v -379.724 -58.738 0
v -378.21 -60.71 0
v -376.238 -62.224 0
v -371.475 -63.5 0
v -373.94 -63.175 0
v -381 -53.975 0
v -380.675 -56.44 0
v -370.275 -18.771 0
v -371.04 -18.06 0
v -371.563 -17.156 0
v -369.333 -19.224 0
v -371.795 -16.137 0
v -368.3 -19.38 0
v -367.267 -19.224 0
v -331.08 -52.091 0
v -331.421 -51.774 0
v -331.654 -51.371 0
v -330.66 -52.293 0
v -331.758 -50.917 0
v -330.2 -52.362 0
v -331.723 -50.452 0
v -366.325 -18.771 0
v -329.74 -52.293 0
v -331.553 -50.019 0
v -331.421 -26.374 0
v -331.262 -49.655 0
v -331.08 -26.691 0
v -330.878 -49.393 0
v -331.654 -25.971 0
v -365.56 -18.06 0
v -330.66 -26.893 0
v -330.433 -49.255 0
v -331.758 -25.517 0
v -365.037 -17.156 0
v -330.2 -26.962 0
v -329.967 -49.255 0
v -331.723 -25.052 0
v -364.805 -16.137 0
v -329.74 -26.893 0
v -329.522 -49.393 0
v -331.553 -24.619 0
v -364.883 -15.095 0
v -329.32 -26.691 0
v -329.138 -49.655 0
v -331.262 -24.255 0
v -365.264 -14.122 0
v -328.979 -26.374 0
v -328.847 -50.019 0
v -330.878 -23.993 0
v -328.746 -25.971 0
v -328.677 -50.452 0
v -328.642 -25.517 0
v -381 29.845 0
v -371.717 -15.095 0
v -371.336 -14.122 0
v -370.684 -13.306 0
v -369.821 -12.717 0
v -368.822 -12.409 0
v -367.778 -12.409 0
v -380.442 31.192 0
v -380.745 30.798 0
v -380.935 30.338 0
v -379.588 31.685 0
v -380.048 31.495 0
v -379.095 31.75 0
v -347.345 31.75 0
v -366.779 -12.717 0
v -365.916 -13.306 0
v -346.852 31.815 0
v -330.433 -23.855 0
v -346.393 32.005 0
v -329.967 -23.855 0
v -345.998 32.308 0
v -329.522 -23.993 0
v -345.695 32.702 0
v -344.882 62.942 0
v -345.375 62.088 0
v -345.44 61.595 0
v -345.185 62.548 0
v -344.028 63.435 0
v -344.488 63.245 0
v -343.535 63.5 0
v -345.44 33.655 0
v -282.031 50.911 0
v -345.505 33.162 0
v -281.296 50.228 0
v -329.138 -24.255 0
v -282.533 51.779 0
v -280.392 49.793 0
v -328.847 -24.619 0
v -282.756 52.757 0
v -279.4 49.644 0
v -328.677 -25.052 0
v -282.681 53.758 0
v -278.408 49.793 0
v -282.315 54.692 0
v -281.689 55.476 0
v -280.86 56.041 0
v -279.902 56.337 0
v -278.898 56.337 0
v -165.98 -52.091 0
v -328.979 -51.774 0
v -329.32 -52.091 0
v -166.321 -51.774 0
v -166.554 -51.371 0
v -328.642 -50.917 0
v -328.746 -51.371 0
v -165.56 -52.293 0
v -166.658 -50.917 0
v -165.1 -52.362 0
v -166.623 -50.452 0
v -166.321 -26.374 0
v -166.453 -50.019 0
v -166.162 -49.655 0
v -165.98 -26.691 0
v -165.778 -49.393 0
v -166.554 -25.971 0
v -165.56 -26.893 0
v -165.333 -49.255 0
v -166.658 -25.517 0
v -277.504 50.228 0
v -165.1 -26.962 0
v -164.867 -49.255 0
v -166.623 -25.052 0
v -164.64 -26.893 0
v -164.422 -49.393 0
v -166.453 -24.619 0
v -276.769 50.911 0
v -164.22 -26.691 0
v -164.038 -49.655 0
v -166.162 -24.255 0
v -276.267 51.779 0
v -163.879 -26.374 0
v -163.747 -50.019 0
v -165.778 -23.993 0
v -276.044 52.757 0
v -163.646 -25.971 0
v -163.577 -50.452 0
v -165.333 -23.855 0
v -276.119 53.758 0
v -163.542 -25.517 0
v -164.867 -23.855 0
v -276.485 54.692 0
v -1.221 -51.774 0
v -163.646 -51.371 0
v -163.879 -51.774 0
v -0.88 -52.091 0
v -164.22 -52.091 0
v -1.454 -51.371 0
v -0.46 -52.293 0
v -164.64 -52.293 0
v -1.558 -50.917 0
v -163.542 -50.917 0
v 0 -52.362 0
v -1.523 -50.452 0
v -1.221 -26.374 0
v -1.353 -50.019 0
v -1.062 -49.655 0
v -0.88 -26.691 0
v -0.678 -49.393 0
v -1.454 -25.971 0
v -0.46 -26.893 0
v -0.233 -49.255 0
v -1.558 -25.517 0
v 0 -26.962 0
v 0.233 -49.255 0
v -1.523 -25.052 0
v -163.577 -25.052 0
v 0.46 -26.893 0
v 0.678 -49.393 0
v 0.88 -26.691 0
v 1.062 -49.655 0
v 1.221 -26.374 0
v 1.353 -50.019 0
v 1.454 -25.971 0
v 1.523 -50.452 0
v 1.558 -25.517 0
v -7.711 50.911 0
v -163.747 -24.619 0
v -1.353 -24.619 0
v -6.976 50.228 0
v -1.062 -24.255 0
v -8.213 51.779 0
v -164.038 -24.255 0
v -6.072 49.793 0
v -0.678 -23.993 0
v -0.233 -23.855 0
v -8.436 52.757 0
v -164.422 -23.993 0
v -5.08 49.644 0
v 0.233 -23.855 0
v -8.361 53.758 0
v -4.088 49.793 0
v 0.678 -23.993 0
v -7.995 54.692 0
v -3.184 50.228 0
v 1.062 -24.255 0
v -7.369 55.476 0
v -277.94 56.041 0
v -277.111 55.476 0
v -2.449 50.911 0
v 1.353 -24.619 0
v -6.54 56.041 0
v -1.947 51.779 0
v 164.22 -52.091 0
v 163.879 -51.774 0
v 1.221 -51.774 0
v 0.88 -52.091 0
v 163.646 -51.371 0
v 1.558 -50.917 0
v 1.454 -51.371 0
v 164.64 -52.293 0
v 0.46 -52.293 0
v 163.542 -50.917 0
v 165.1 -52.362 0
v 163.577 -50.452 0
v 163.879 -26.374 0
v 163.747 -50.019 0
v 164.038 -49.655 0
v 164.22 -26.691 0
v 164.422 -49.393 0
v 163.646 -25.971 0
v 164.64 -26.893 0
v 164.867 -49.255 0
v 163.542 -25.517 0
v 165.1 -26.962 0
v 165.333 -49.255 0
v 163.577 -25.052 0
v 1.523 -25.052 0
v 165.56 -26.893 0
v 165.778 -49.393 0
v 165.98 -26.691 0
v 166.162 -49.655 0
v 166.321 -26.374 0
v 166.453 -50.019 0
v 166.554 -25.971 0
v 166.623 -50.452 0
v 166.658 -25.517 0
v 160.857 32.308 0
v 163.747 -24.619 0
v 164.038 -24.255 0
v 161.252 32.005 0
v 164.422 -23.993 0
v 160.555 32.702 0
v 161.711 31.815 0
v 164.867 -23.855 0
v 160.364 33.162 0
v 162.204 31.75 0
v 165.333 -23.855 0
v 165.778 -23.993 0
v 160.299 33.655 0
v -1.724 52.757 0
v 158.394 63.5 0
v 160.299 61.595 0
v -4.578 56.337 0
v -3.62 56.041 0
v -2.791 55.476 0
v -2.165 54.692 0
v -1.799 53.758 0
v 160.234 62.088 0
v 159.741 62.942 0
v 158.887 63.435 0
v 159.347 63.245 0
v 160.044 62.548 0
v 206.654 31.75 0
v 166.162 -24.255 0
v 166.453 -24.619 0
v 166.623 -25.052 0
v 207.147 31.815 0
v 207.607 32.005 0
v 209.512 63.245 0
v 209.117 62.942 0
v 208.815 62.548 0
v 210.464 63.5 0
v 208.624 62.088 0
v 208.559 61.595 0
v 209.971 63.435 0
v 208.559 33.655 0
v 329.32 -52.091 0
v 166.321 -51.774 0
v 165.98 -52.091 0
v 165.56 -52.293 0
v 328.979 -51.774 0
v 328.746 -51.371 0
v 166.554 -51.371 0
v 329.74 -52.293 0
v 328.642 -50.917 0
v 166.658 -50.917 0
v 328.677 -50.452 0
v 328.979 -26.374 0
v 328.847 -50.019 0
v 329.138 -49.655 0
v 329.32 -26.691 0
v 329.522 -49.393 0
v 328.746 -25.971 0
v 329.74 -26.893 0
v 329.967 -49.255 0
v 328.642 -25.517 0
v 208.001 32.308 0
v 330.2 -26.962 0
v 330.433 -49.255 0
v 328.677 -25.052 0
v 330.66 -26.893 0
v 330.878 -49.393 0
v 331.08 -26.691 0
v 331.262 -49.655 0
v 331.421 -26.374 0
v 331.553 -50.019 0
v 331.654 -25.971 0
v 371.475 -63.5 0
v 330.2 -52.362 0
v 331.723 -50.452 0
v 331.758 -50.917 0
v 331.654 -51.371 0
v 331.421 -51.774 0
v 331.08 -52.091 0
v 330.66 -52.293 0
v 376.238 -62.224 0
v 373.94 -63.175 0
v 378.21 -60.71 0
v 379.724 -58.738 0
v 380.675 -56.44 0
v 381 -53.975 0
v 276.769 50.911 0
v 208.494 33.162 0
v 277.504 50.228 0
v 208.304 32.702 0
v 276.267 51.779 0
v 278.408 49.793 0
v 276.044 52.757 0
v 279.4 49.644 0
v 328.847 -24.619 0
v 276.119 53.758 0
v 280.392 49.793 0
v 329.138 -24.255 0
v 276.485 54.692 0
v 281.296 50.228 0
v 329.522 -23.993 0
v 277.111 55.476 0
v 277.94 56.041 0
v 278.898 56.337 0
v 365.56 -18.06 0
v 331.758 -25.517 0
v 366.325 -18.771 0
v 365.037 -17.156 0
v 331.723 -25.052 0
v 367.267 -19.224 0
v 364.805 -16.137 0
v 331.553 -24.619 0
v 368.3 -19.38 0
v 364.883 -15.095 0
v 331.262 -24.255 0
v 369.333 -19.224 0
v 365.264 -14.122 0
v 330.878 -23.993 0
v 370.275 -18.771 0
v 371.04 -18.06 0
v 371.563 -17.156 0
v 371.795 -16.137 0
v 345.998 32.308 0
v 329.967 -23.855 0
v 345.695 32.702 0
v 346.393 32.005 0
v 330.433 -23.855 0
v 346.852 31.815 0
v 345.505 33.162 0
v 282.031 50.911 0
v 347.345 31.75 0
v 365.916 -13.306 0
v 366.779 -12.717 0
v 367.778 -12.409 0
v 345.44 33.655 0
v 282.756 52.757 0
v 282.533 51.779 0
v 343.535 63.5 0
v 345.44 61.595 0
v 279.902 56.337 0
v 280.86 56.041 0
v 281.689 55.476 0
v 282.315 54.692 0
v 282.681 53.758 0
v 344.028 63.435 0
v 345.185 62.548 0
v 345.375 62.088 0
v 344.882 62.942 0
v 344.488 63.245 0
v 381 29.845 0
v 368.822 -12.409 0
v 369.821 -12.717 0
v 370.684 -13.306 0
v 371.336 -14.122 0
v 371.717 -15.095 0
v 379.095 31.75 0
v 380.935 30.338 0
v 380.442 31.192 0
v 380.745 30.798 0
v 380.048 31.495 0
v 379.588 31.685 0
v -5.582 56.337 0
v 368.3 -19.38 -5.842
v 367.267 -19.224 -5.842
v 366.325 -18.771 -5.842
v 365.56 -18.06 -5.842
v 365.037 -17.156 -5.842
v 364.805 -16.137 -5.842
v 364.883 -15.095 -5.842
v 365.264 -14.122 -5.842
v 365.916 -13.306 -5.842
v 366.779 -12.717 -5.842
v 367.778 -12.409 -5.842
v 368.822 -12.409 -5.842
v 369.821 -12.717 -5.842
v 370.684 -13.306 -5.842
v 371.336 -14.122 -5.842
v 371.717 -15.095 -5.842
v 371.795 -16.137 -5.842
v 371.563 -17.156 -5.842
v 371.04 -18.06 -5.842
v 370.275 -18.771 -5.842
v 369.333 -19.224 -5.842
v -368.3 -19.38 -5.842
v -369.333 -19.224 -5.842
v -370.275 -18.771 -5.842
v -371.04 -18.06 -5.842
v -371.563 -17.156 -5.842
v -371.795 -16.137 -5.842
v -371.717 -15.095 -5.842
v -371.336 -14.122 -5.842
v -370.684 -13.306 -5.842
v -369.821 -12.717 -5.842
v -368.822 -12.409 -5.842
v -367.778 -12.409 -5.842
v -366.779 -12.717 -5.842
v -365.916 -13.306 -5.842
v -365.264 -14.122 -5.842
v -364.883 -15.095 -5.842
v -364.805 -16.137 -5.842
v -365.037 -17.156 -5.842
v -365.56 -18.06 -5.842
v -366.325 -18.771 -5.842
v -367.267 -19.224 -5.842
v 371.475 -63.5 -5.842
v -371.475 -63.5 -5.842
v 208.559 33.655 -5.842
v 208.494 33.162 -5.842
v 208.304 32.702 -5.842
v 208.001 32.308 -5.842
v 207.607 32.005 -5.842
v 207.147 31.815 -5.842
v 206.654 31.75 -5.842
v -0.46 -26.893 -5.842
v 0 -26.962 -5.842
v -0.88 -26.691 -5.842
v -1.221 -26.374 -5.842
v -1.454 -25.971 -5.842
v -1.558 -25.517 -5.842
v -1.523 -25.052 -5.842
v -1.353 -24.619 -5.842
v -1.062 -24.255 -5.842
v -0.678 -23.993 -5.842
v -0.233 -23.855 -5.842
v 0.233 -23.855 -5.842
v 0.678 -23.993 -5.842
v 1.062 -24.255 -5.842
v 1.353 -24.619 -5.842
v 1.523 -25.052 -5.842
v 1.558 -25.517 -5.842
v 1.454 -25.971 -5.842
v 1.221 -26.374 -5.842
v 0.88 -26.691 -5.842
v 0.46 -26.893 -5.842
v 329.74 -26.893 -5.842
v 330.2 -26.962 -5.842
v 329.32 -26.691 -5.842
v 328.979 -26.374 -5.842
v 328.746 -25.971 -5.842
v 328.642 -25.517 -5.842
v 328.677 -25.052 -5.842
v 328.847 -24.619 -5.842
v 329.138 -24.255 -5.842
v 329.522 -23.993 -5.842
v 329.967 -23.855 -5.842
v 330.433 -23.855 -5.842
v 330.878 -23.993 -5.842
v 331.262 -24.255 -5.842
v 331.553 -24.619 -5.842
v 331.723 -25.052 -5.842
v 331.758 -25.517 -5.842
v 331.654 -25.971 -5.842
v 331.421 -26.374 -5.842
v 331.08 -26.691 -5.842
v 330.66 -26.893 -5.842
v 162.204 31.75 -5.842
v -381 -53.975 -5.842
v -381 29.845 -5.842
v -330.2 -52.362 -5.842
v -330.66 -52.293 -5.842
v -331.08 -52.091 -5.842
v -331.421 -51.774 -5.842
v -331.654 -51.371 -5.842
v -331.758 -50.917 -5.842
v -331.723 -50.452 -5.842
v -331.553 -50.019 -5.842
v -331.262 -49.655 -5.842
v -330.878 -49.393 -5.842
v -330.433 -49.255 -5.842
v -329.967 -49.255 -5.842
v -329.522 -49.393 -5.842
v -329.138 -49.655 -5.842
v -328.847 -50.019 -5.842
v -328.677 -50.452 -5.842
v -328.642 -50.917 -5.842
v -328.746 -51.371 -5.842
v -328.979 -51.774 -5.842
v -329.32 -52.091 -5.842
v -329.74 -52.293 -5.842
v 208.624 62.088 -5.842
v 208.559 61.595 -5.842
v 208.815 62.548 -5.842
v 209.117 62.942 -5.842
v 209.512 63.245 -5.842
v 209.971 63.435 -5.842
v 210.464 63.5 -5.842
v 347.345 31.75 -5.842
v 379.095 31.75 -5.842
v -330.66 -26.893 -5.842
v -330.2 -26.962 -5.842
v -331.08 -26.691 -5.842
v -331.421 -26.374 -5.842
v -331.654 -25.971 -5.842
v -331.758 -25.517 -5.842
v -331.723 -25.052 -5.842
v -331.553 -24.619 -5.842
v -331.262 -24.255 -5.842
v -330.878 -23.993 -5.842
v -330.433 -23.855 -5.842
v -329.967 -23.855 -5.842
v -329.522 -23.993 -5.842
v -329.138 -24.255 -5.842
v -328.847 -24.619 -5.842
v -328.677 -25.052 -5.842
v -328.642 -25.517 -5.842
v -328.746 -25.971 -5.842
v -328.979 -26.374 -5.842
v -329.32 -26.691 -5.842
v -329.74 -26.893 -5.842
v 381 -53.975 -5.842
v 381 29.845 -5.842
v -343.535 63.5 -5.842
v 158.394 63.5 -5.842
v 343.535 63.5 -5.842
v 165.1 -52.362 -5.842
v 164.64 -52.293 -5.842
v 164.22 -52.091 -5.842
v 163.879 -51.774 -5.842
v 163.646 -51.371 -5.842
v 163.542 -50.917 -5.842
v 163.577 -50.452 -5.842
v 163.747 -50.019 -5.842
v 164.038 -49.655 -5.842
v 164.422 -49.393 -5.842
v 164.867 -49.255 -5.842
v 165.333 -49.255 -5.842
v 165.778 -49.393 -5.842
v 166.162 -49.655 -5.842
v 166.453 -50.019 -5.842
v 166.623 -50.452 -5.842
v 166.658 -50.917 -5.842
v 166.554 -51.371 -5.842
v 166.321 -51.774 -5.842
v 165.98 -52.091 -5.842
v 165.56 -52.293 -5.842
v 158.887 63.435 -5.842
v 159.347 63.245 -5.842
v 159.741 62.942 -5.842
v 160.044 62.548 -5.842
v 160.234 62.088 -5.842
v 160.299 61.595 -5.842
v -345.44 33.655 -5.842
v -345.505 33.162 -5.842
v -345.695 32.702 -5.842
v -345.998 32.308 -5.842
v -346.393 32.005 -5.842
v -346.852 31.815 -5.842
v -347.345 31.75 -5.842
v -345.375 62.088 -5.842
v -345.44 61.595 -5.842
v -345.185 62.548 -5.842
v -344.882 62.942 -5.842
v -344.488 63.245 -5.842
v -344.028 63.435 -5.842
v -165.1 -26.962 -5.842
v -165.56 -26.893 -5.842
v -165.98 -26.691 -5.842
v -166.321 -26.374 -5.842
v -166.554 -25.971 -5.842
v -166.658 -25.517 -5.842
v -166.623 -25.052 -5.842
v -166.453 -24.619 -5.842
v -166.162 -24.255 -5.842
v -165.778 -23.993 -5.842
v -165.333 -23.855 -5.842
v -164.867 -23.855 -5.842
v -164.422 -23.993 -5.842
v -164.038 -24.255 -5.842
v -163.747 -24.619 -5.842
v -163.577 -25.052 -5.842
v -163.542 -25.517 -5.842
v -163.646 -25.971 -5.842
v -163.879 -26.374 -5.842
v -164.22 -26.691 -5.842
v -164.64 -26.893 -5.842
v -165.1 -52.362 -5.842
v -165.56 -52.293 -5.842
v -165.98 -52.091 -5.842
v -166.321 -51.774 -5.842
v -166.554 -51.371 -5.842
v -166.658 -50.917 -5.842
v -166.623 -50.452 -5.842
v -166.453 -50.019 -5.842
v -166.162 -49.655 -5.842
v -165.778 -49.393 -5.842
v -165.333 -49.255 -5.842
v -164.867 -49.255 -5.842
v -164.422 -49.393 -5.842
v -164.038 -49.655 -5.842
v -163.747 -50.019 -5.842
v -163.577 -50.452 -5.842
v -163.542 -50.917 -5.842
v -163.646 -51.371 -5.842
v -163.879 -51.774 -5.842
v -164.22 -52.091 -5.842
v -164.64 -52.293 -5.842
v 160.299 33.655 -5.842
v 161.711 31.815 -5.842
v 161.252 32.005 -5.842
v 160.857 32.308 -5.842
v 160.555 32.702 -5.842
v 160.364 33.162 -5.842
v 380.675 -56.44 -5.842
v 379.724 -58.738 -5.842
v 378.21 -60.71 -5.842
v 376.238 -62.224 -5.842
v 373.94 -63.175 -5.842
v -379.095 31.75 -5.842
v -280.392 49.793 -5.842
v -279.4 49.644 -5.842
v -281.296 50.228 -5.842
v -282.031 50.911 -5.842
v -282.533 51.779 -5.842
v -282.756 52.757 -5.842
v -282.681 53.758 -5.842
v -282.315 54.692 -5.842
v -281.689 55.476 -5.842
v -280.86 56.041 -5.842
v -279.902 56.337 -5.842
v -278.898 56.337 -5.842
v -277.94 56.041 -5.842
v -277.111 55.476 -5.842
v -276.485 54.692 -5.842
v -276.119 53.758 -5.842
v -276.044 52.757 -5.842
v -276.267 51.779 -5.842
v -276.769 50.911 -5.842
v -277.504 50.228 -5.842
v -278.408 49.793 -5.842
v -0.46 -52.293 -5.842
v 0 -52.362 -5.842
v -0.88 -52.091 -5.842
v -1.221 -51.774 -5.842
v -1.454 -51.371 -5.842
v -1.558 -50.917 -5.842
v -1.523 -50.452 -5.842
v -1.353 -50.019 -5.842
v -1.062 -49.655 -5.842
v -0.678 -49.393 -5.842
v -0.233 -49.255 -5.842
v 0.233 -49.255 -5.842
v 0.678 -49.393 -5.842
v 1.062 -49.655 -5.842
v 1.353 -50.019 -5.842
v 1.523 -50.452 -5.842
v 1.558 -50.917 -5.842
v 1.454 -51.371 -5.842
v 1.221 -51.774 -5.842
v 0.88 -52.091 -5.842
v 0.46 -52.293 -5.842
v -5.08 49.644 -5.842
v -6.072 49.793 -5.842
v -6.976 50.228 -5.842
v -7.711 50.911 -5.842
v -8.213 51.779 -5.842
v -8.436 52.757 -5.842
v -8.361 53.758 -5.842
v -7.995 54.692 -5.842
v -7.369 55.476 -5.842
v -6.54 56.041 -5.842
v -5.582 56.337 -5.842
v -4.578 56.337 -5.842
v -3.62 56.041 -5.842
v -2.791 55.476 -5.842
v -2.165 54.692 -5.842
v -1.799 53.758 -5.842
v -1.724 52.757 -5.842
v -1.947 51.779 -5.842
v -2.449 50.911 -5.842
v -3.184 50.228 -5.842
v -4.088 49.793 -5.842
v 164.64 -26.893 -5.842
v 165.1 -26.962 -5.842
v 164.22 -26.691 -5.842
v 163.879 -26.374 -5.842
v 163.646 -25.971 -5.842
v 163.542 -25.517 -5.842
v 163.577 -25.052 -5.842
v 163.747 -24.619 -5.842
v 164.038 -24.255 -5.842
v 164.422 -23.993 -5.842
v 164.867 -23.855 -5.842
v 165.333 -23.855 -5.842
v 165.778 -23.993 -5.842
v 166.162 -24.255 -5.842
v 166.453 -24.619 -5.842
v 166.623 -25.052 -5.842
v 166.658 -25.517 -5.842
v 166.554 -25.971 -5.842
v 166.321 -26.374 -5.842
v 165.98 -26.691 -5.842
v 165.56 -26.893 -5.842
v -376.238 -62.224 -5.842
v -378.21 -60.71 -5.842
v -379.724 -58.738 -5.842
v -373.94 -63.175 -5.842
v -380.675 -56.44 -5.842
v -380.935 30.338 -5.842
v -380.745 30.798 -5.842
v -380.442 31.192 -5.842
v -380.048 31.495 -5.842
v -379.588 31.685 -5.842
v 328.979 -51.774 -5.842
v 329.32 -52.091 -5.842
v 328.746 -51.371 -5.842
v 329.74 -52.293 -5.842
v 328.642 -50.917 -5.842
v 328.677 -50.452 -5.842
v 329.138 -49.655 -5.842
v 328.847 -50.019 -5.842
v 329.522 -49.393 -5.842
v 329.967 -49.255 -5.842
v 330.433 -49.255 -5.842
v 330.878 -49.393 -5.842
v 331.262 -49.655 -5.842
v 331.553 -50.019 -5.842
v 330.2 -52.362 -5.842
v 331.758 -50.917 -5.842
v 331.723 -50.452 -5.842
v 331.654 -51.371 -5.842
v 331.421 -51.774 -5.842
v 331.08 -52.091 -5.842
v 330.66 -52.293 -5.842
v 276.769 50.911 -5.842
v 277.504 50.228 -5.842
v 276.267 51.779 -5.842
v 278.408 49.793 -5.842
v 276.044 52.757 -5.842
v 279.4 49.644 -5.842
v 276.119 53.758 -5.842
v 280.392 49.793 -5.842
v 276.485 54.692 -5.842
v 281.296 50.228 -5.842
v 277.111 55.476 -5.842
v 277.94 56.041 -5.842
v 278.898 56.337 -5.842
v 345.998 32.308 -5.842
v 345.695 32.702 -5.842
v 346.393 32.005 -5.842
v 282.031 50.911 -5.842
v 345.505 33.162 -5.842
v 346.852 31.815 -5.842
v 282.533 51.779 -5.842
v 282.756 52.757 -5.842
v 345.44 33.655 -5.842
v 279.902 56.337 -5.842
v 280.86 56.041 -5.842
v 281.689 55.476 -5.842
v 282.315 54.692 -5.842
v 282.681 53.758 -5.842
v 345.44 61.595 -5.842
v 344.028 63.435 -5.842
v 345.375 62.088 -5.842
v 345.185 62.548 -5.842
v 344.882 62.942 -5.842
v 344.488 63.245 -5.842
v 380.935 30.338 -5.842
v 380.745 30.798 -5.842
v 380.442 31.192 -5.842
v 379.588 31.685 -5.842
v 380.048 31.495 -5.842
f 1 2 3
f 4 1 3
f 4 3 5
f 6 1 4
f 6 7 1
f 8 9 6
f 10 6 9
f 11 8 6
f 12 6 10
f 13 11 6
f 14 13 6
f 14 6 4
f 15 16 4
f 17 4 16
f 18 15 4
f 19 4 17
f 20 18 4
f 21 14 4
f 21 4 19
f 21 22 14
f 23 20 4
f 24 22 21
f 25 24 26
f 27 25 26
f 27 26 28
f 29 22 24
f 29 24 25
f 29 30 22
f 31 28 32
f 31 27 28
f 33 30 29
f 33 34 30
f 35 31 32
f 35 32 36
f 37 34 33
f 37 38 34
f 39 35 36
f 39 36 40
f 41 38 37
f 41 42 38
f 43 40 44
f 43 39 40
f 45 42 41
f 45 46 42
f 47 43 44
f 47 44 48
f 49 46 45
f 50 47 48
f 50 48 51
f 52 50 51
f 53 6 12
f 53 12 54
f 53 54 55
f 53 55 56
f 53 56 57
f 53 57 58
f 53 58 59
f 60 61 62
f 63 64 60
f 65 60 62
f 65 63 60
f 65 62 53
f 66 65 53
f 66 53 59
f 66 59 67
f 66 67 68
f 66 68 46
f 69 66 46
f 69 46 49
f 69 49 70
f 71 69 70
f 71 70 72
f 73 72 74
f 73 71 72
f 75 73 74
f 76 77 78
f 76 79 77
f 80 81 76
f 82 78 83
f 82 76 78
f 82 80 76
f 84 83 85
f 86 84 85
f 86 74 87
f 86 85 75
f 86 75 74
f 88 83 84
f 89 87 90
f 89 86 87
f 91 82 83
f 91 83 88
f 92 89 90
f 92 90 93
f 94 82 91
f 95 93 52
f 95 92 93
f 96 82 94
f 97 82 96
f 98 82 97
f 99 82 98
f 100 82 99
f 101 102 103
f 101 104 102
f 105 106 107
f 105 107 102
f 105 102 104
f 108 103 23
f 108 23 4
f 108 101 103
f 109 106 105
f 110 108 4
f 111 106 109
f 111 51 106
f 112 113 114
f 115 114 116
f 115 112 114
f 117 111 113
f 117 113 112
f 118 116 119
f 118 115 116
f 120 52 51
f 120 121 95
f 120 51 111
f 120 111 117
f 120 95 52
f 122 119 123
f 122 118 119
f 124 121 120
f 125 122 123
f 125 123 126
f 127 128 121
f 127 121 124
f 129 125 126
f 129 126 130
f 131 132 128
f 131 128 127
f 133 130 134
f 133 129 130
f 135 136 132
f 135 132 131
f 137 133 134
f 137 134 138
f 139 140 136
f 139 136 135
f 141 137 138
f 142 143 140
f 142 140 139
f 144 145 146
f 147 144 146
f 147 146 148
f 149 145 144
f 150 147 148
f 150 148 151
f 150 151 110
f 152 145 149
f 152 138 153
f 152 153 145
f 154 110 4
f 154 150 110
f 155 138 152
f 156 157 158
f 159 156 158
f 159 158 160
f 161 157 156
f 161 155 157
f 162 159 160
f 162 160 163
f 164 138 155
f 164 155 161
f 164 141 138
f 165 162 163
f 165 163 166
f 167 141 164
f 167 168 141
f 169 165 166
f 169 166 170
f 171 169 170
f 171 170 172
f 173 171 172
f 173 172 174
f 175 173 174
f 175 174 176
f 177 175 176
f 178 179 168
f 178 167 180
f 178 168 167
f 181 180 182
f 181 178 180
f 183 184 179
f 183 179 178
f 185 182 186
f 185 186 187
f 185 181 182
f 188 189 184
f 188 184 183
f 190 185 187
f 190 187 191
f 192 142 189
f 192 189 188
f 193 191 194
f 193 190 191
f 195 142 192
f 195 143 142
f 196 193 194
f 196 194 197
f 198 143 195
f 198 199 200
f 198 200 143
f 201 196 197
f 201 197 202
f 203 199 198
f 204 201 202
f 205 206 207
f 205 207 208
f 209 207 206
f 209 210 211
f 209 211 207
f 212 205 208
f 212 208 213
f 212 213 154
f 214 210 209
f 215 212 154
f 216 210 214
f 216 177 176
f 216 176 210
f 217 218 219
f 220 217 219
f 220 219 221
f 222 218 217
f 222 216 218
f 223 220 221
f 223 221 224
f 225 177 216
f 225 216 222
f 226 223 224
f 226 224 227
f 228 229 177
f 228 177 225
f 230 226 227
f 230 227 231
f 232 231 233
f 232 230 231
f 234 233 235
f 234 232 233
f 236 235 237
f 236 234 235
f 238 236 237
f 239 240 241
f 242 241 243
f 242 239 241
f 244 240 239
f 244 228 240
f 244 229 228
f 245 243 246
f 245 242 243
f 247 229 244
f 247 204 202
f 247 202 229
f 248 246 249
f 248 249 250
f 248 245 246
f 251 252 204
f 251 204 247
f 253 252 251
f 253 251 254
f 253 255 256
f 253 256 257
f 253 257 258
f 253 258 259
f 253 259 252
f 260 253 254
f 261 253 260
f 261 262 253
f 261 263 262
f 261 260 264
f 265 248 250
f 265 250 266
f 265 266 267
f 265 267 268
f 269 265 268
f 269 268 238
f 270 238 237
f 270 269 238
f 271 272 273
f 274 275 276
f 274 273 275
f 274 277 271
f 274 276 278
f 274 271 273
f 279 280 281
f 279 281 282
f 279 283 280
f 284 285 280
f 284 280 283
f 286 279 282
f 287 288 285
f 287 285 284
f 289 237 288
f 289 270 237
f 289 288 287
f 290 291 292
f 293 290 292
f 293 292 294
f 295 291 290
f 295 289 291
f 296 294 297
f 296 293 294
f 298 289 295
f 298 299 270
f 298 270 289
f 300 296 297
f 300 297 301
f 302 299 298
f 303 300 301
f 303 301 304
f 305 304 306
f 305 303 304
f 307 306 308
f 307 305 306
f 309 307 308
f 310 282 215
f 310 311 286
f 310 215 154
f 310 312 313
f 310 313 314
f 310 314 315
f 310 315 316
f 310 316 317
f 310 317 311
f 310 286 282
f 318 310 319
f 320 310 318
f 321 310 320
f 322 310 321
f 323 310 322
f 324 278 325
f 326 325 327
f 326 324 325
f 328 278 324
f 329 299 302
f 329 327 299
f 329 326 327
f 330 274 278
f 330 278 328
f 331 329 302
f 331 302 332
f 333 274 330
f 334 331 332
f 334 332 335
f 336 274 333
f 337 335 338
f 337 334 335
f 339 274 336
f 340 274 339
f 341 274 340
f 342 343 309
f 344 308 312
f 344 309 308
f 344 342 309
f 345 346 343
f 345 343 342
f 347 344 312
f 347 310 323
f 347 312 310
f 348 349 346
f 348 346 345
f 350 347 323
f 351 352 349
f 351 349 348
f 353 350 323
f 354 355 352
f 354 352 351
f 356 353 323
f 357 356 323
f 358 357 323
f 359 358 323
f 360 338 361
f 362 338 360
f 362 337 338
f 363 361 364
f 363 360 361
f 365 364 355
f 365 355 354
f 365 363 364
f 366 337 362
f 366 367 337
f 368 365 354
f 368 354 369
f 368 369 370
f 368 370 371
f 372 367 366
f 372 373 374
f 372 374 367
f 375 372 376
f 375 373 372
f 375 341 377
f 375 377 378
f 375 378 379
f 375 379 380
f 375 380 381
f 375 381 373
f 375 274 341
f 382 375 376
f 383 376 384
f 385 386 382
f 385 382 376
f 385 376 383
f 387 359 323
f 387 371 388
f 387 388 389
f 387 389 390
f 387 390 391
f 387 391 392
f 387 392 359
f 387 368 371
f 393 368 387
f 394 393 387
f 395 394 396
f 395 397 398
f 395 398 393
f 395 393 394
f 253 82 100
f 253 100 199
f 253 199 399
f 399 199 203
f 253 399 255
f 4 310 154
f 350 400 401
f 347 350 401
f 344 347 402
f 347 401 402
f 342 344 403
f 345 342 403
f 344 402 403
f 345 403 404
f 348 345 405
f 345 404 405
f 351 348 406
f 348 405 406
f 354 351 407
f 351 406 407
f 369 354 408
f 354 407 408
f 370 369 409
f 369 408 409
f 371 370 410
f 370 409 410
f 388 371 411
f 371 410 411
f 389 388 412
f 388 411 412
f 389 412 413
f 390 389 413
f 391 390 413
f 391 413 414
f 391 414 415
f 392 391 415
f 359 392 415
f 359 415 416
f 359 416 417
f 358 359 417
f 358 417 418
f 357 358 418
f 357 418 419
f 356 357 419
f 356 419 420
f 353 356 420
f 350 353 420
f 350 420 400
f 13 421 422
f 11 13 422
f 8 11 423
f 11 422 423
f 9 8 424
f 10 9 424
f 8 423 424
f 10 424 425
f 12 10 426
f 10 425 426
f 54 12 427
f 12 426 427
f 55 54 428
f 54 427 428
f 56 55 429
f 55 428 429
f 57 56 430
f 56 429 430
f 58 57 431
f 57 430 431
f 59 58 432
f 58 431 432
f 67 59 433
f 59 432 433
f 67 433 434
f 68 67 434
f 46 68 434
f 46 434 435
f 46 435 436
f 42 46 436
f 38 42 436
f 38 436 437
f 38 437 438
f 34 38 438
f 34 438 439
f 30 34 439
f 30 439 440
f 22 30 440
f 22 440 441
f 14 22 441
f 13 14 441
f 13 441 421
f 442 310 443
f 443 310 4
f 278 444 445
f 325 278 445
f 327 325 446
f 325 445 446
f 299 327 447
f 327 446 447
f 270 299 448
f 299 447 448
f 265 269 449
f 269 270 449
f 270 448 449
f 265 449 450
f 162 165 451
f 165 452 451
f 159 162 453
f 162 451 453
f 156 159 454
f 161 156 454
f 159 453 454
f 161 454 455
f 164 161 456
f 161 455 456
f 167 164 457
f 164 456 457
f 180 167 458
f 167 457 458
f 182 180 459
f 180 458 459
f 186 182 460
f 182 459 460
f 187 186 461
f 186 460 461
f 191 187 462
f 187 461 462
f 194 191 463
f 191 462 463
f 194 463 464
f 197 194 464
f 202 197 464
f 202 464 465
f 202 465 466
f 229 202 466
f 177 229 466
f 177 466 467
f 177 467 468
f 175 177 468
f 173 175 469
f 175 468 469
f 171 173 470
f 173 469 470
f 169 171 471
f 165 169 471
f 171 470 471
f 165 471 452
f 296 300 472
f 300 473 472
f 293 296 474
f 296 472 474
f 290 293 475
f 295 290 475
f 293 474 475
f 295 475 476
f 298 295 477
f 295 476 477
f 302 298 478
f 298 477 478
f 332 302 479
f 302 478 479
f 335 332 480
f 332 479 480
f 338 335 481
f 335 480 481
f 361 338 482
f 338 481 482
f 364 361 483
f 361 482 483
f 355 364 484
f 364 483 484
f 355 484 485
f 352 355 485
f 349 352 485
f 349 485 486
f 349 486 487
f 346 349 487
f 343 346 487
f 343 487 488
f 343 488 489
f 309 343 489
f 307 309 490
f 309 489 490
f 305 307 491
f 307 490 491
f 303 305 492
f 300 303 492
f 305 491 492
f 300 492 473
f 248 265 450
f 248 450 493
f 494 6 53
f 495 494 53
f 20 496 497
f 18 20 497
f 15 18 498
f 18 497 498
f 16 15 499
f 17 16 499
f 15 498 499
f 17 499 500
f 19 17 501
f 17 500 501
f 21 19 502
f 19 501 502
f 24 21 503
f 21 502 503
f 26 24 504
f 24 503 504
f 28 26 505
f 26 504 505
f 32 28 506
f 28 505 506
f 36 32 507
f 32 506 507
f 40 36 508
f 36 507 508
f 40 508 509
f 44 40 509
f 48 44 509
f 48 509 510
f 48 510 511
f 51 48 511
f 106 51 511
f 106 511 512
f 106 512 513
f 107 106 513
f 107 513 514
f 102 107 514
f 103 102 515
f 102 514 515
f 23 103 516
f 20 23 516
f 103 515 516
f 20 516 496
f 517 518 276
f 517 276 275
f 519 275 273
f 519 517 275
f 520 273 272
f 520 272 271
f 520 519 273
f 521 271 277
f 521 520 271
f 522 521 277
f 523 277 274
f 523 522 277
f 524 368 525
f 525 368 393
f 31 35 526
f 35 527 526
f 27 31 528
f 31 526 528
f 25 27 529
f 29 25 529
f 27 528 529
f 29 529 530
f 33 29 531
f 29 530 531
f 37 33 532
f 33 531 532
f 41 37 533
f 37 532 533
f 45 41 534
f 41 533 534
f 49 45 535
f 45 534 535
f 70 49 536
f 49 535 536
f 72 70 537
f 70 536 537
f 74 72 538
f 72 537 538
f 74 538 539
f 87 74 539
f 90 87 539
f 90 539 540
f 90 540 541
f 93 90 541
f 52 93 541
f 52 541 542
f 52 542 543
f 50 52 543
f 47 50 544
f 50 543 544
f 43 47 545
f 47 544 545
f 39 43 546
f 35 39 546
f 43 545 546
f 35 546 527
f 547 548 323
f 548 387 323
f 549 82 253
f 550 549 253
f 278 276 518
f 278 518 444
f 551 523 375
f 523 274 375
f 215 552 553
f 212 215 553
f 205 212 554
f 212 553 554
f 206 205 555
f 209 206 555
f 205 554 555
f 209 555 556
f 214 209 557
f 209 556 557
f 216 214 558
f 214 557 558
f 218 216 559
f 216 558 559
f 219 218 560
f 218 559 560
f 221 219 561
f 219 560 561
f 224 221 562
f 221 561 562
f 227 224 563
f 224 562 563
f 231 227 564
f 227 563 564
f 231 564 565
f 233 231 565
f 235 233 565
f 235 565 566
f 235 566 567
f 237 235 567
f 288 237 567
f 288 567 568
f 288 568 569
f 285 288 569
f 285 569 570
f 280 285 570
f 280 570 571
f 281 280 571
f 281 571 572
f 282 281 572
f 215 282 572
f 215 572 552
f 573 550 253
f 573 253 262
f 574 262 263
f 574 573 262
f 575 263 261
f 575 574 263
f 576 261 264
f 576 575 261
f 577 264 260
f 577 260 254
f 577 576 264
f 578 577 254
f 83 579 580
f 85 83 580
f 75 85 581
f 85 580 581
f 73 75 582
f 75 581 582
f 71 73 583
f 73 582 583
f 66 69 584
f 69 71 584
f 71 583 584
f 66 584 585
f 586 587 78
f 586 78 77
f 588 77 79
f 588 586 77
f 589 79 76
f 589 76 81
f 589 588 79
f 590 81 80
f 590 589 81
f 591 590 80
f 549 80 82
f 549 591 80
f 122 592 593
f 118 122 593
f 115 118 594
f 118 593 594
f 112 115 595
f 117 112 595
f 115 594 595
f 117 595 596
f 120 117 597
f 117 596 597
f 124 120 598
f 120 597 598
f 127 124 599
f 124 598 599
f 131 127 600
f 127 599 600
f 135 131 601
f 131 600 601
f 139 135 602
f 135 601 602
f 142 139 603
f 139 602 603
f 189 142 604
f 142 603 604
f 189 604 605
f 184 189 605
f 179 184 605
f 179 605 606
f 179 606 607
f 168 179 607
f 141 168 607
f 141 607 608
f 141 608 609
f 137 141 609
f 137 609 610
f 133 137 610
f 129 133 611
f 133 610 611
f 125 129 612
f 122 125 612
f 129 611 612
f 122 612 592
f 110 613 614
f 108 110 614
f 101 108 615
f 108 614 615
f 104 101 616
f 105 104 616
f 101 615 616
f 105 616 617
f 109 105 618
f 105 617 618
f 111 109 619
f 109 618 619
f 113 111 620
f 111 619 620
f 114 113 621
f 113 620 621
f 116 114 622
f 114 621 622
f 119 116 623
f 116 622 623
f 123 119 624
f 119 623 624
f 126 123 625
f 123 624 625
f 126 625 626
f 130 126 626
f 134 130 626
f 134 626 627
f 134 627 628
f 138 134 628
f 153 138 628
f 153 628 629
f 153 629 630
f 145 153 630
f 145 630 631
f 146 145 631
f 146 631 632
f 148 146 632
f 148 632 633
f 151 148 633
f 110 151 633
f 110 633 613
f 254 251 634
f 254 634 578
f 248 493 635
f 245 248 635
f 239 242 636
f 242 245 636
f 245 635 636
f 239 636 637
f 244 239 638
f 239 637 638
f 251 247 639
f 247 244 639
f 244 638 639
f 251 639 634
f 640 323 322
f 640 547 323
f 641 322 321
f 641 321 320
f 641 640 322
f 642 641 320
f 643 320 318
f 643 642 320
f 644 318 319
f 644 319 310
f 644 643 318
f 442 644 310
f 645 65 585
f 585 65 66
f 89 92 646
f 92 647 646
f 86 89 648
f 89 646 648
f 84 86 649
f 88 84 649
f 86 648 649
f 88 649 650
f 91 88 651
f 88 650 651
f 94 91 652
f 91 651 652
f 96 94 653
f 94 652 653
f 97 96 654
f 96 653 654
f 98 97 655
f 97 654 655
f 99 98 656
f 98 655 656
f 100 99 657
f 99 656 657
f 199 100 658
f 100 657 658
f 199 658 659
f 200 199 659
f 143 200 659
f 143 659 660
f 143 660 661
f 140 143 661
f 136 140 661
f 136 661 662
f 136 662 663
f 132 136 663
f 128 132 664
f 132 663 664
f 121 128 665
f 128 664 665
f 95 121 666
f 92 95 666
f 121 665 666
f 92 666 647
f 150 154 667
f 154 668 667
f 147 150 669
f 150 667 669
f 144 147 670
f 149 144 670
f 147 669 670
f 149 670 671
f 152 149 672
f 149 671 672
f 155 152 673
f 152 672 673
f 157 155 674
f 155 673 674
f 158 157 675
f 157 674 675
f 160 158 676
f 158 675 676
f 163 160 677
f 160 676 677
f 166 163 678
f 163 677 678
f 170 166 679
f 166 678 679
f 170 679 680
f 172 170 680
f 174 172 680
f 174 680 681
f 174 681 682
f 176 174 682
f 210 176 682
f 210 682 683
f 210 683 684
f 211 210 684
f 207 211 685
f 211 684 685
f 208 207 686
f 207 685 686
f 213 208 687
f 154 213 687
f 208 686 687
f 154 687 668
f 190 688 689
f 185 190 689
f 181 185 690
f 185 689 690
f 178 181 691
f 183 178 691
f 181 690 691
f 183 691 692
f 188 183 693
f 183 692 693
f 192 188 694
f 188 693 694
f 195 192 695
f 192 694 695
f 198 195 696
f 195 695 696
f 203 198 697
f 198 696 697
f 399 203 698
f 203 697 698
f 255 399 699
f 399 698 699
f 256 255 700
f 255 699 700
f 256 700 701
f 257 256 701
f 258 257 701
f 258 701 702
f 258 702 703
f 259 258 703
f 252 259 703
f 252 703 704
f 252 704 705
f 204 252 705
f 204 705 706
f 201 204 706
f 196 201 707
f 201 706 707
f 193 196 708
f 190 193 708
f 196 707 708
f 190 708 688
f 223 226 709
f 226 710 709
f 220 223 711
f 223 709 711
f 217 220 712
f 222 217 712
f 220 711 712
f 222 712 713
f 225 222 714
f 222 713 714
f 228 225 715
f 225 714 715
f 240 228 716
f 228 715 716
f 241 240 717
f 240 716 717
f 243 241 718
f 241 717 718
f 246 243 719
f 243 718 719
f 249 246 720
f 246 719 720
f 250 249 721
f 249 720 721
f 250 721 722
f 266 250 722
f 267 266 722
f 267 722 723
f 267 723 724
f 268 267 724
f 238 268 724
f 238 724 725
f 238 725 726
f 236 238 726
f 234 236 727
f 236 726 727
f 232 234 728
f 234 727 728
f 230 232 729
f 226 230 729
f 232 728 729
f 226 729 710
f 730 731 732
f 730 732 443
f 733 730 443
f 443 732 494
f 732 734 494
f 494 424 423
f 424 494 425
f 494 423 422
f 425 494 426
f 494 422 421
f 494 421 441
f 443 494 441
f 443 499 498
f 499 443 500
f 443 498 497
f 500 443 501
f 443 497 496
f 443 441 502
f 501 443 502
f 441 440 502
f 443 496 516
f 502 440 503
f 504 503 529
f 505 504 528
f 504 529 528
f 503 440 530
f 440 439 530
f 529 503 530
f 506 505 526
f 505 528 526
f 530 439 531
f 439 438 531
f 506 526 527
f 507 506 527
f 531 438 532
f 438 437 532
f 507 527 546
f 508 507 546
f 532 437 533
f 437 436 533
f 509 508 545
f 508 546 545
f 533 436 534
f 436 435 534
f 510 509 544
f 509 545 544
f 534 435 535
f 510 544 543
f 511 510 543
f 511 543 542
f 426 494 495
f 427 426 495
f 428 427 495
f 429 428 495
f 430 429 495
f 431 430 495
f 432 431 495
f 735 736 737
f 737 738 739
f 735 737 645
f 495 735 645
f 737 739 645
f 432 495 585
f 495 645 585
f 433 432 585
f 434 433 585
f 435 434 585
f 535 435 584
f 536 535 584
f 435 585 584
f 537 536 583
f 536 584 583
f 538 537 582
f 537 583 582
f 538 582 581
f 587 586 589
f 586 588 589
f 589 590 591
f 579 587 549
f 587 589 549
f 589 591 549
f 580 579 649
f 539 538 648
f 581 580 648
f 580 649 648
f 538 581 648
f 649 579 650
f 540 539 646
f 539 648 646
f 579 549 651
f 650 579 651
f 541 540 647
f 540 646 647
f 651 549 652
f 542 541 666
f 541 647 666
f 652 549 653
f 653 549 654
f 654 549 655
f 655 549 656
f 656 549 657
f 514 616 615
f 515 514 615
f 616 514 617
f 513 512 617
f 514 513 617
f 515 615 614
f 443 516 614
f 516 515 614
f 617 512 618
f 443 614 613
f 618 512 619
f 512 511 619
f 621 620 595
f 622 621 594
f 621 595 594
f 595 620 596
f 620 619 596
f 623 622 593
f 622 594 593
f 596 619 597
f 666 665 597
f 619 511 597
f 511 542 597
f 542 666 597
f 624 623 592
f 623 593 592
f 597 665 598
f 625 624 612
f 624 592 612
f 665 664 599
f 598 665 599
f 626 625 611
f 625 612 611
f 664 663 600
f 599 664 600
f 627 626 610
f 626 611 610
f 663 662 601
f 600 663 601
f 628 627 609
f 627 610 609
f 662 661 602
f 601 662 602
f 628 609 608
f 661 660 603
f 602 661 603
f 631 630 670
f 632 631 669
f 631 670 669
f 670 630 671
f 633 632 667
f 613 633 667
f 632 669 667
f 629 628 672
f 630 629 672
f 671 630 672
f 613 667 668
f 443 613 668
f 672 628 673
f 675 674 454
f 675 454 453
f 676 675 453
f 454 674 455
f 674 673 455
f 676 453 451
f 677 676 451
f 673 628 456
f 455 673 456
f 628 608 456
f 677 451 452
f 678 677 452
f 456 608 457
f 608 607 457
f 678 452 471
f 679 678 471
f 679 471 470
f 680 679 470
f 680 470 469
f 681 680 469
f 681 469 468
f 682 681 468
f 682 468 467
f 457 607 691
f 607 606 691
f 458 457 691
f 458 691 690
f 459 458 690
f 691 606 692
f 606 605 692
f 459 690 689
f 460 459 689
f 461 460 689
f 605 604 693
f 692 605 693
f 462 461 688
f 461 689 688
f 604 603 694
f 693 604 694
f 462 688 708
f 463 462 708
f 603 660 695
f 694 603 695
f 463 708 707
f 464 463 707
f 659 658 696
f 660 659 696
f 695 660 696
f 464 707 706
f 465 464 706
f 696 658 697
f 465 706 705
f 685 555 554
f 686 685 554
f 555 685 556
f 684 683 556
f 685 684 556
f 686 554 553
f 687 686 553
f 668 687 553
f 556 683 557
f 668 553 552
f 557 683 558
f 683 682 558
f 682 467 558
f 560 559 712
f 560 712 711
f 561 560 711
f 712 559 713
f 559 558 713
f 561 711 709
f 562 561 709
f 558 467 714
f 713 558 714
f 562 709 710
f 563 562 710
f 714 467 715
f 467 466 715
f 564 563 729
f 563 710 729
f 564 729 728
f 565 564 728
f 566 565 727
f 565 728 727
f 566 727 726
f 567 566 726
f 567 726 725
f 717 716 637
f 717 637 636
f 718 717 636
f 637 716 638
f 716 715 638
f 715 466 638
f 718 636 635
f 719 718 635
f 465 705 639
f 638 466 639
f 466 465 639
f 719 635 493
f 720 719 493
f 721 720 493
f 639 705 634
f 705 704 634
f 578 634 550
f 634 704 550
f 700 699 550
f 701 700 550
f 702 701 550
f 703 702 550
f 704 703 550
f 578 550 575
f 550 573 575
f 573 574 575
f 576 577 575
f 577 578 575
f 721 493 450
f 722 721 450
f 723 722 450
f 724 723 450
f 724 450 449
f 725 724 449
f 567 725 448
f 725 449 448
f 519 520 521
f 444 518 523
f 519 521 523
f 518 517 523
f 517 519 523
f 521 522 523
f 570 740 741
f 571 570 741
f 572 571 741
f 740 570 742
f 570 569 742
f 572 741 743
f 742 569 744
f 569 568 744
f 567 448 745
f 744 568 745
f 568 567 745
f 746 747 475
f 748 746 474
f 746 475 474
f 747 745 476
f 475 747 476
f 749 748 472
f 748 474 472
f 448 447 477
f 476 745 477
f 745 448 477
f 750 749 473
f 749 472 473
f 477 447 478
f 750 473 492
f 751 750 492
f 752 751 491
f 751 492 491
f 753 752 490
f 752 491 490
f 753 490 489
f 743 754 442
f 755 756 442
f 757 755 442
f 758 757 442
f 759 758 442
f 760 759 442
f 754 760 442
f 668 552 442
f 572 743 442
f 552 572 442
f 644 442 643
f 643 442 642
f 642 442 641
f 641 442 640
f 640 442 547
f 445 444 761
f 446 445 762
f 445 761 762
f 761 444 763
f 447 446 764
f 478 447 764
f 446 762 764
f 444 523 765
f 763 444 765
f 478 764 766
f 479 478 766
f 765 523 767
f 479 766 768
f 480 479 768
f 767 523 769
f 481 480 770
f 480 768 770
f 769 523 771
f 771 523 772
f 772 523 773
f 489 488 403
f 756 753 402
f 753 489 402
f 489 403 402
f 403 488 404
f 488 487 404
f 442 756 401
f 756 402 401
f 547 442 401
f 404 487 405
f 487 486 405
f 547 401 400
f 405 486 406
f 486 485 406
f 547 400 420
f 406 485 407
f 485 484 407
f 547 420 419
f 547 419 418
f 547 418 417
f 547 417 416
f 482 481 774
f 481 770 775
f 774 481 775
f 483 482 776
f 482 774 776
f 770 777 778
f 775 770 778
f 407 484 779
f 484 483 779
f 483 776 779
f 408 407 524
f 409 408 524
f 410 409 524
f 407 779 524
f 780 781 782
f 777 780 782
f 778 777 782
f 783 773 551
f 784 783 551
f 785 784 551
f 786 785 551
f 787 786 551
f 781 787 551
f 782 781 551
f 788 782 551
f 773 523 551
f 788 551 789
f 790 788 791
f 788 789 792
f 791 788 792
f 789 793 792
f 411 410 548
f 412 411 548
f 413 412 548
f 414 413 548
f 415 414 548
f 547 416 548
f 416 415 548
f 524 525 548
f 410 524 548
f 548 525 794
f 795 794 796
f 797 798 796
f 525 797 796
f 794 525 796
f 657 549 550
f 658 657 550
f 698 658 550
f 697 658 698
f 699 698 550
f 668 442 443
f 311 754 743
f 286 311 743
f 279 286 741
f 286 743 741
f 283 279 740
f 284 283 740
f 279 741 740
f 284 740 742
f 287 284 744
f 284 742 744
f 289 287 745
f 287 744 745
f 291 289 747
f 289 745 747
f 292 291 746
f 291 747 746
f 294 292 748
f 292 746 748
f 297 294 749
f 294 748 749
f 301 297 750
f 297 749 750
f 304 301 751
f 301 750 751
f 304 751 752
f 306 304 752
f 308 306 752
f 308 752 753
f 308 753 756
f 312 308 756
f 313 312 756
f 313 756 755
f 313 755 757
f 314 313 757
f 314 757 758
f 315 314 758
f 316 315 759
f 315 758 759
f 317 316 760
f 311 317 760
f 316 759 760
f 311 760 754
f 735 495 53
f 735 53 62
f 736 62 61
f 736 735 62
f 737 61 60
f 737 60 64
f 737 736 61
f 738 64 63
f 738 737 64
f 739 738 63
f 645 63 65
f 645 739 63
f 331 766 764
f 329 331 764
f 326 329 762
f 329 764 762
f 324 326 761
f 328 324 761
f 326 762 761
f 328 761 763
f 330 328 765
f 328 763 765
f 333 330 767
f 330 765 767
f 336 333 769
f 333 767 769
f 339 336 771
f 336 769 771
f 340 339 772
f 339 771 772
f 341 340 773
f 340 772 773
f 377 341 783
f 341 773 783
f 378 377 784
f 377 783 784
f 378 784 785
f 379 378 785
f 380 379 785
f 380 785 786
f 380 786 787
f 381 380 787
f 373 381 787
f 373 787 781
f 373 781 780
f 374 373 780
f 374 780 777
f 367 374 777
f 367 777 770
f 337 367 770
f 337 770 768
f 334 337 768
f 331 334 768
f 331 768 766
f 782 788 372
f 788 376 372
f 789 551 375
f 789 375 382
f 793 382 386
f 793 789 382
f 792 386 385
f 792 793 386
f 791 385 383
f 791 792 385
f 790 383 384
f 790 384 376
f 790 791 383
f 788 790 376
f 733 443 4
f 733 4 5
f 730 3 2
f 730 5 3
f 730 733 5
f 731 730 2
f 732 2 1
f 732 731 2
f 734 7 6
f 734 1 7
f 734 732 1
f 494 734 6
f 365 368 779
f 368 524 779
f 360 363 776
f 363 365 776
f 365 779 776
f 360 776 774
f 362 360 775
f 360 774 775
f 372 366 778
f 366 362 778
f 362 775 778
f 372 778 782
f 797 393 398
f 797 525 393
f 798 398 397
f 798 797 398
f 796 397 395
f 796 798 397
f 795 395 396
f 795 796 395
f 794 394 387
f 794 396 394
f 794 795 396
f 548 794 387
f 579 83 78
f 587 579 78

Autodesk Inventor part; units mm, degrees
ref_plane "YZ Plane" through (0, 0, 0) normal (1, 0, 0) x (0, 1, 0)
ref_plane "XZ Plane" through (0, 0, 0) normal (0, 1, 0) x (-1, 0, 0)
ref_plane "XY Plane" through (0, 0, 0) normal (0, 0, 1) x (1, 0, 0)
sketch "Sketch1" plane through (0, 0, 0) normal (0, 0, 1) x (1, 0, 0)
  line L0 (0, 88.9) -> (0, -88.9) projected
  line L1 (-533.4, 0) -> (533.4, 0) projected
  line L2 (381, -63.5) -> (-381, -63.5)
  line L3 (-381, -63.5) -> (-381, 63.5)
  line L4 (-381, 63.5) -> (381, 63.5)
  line L5 (381, 63.5) -> (381, -63.5)
  line L6 (381, -63.5) -> (-381, 63.5) construction
  line L7 (-381, -63.5) -> (381, 63.5) construction
  line L8 (-170.942, -37.592) -> (-127, -37.592) construction
  line L9 (-127, -37.592) -> (-127, -63.5) construction
  line L10 (-127, -63.5) -> (-170.942, -63.5) construction
  line L11 (-170.942, -63.5) -> (-170.942, -37.592) construction
  line L12 (127, -37.592) -> (170.942, -37.592) construction
  line L13 (170.942, -37.592) -> (170.942, -63.5) construction
  line L14 (170.942, -63.5) -> (127, -63.5) construction
  line L15 (127, -63.5) -> (127, -37.592) construction
  line L16 (-381, 31.75) -> (-345.44, 31.75)
  line L17 (-345.44, 31.75) -> (-345.44, 63.5)
  line L18 (345.44, 63.5) -> (345.44, 31.75)
  line L19 (345.44, 31.75) -> (381, 31.75)
  line L20 (368.3, -44.45) -> (-368.3, -44.45) construction
  line L21 (-368.3, -44.45) -> (-368.3, 12.7) construction
  line L22 (-368.3, 12.7) -> (368.3, 12.7) construction
  line L23 (368.3, 12.7) -> (368.3, -44.45) construction
  line L24 (368.3, -44.45) -> (-368.3, 12.7) construction
  line L25 (-368.3, -44.45) -> (368.3, 12.7) construction
  line L26 (328.6125, -23.8125) -> (357.1875, -23.8125)
  line L27 (357.1875, -23.8125) -> (357.1875, 23.8125)
  line L28 (357.1875, 23.8125) -> (328.6125, 23.8125)
  line L29 (328.6125, 23.8125) -> (328.6125, -23.8125)
  line L30 (328.6125, -23.8125) -> (357.1875, 23.8125) construction
  line L31 (357.1875, -23.8125) -> (328.6125, 23.8125) construction
  line L32 (-42.8625, -23.8125) -> (-14.2875, -23.8125)
  line L33 (-14.2875, -23.8125) -> (-14.2875, 23.8125)
  line L34 (-14.2875, 23.8125) -> (-42.8625, 23.8125)
  line L35 (-42.8625, 23.8125) -> (-42.8625, -23.8125)
  line L36 (-42.8625, -23.8125) -> (-14.2875, 23.8125) construction
  line L37 (-14.2875, -23.8125) -> (-42.8625, 23.8125) construction
  point P0 (0, 0)
  point P1 (-159.004, -63.5)
  point P2 (138.938, -63.5)
  point P3 (-279.4, 53.009)
  point P4 (279.4, 53.009)
  point P5 (-5.08, 53.009)
  point P6 (0, -15.875)
  point P7 (342.9, 0)
  point P8 (-28.575, 0)
  point P9 (-368.3, -15.875)
  point P10 (368.3, -15.875)
  dimension "d0" = 762
  dimension "d1" = 127
  dimension "d2" = 43.942
  dimension "d3" = 25.908
  dimension "d4" = 32.004
  dimension "d5" = 127
  dimension "d7" = 32.004
  dimension "d8" = 127
  dimension "d9" = 10.491
  dimension "d65" = 31.75
  dimension "d66" = 345.44
  dimension "d67" = 736.6
  dimension "d68" = 19.05
  dimension "d69" = 19.05
  dimension "d84" = 279.4
  dimension "d85" = 279.4
  dimension "d86" = 5.08
  dimension "d87" = 28.575
  dimension "d88" = 47.625
  dimension "d89" = 0
  dimension "d90" = 28.575
  dimension "d91" = 342.9
  dimension "d94" = 101.092
extrude "Extrusion1" add sketch "Sketch1" against normal blind 5.842 contours L4 L18 L19 L5 L1 L27 L28 L29 L0 | L0 L1 L33 L34 L35 L3 L16 L17 L4 | L1 L29 L26 L27 L5 L2 L0 | L0 L2 L3 L1 L35 L32 L33 | L33 L32 L35 L1 | L1 L35 L34 L33 | L29 L28 L27 L1 | L1 L27 L26 L29
hole "Hole2" at (-279.4, 53.009, 0) at (279.4, 53.009, 0) at (-5.08, 53.009, 0) direction (0, 0, -1) diameter 6.731 end through all
fillet "Fillet1" radius 9.525 2 edges at (381, -63.5, -2.921) (-381, -63.5, -2.921)
hole "Hole5" at (-368.3, -15.875, 0) at (368.3, -15.875, 0) direction (0, 0, -1) diameter 7.0104 end through all clearance for "Socket Head Cap Screw" size "M6" standard "Ansi Metric M Profile"
fillet "Fillet2" radius 1.905 6 edges at (-381, 31.75, -2.921) (-345.44, 31.75, -2.921) (-345.44, 63.5, -2.921) (345.44, 63.5, -2.921) (381, 31.75, -2.921) (345.44, 31.75, -2.921)
sketch "Sketch4" plane through (0, 0, 0) normal (0, 0, 1) x (1, 0, 0)
  line L0 (343.535, 63.5) -> (-343.535, 63.5) projected
  line L1 (208.5594, 31.75) -> (160.2994, 31.75)
  line L2 (160.2994, 31.75) -> (160.2994, 63.5)
  line L3 (160.2994, 63.5) -> (208.5594, 63.5)
  line L4 (208.5594, 63.5) -> (208.5594, 31.75)
  line L5 (208.5594, 31.75) -> (160.2994, 63.5) construction
  line L6 (160.2994, 31.75) -> (208.5594, 63.5) construction
  line L7 (0, 88.9) -> (0, -88.9) projected
  point P0 (0, 0)
  point P1 (184.4294, 47.625)
  point P2 (208.5594, 63.5)
  dimension "d78" = 48.26
  dimension "d80" = 31.75
  dimension "d83" = 184.4294
extrude "Extrusion2" cut sketch "Sketch4" against normal through all
fillet "Fillet3" radius 1.905 4 edges at (160.2994, 63.5, -2.921) (160.2994, 31.75, -2.921) (208.5594, 31.75, -2.921) (208.5594, 63.5, -2.921)
sketch "Sketch5" plane through (0, 0, 0) normal (0, 0, 1) x (1, 0, 0)
  line L0 (371.475, -63.5) -> (-371.475, -63.5) projected
  line L1 (0, 88.9) -> (0, -88.9) projected
  line L2 (330.2, -50.8) -> (-330.2, -50.8) construction
  line L3 (-371.475, -63.5) -> (371.475, -63.5) construction
  point P0 (0, 0)
  point P1 (0, -50.8)
  point P2 (165.1, -50.8)
  point P3 (-165.1, -50.8)
  dimension "d108" = 330.2
  dimension "d109" = 330.2
  dimension "d110" = 12.7
  dimension "d118" = 165.1
  dimension "d119" = 165.1
hole "Hole6" at (330.2, -50.8, 0) at (0, -50.8, 0) at (-330.2, -50.8, 0) at (165.1, -50.8, 0) at (-165.1, -50.8, 0) direction (0, 0, -1) diameter 3.1242 end through all
pattern_linear "Rectangular Pattern2" count 2 spacing 25.4 along (0, 1, 0) of "Hole6"
equation "\"d118\" = 0.5 * d109"
equation "\"d119\" = 0.5 * d109"
properties material "ACRYLIC, BLACK"
